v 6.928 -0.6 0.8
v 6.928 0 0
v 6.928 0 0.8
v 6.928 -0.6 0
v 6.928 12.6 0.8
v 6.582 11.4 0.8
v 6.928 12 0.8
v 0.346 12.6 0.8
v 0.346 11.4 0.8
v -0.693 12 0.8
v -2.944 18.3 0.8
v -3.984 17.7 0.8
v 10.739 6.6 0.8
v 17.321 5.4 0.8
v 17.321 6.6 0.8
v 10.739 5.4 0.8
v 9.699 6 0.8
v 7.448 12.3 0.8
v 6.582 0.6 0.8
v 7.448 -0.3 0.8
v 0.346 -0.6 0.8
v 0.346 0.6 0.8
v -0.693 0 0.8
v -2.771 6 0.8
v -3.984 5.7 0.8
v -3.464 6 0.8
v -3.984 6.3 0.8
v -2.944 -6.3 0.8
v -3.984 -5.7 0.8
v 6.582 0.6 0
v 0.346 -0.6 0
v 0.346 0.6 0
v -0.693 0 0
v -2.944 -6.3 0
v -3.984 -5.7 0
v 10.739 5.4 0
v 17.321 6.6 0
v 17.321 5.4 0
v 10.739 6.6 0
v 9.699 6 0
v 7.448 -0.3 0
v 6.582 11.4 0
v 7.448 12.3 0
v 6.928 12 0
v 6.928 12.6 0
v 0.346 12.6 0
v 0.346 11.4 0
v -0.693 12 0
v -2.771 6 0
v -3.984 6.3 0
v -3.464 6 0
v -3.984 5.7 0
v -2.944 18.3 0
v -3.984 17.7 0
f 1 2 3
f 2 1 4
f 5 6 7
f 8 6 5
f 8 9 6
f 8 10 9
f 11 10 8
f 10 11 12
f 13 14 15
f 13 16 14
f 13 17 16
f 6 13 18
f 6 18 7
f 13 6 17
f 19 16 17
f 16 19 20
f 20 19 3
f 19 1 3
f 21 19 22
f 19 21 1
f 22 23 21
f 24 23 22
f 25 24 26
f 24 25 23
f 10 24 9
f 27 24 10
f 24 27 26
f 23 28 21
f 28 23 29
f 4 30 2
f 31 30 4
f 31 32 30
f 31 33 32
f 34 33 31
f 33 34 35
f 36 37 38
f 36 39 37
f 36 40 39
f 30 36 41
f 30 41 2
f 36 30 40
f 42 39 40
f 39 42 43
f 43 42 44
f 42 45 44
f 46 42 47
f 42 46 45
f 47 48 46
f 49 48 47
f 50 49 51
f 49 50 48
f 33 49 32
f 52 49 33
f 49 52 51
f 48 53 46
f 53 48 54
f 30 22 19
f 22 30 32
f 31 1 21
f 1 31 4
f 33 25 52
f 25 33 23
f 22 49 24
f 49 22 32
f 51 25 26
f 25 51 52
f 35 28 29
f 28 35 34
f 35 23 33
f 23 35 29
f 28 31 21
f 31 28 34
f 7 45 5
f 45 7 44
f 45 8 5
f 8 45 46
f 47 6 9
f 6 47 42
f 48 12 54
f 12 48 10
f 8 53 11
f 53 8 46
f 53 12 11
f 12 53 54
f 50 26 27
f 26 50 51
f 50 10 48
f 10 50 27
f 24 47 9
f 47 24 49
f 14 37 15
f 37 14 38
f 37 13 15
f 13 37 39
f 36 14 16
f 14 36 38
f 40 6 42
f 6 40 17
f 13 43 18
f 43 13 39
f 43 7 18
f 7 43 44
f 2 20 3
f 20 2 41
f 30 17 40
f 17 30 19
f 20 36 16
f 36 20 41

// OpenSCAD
//
// another try at hex lattice
//

a = 4*sqrt(3);
h = 6;

n = 5;

thk = 0.8;
wid = 1.2;

// draw a "star" from a virtex
module star() {
  for( th = [0:120:240])
    rotate( [0, 0, th])
      translate( [0, -wid/2, 0])
      cube( [a, wid, thk]);
}

star();
translate( [0, 2*h, 0]) star();
translate( [1.5*a, h, 0]) star();
